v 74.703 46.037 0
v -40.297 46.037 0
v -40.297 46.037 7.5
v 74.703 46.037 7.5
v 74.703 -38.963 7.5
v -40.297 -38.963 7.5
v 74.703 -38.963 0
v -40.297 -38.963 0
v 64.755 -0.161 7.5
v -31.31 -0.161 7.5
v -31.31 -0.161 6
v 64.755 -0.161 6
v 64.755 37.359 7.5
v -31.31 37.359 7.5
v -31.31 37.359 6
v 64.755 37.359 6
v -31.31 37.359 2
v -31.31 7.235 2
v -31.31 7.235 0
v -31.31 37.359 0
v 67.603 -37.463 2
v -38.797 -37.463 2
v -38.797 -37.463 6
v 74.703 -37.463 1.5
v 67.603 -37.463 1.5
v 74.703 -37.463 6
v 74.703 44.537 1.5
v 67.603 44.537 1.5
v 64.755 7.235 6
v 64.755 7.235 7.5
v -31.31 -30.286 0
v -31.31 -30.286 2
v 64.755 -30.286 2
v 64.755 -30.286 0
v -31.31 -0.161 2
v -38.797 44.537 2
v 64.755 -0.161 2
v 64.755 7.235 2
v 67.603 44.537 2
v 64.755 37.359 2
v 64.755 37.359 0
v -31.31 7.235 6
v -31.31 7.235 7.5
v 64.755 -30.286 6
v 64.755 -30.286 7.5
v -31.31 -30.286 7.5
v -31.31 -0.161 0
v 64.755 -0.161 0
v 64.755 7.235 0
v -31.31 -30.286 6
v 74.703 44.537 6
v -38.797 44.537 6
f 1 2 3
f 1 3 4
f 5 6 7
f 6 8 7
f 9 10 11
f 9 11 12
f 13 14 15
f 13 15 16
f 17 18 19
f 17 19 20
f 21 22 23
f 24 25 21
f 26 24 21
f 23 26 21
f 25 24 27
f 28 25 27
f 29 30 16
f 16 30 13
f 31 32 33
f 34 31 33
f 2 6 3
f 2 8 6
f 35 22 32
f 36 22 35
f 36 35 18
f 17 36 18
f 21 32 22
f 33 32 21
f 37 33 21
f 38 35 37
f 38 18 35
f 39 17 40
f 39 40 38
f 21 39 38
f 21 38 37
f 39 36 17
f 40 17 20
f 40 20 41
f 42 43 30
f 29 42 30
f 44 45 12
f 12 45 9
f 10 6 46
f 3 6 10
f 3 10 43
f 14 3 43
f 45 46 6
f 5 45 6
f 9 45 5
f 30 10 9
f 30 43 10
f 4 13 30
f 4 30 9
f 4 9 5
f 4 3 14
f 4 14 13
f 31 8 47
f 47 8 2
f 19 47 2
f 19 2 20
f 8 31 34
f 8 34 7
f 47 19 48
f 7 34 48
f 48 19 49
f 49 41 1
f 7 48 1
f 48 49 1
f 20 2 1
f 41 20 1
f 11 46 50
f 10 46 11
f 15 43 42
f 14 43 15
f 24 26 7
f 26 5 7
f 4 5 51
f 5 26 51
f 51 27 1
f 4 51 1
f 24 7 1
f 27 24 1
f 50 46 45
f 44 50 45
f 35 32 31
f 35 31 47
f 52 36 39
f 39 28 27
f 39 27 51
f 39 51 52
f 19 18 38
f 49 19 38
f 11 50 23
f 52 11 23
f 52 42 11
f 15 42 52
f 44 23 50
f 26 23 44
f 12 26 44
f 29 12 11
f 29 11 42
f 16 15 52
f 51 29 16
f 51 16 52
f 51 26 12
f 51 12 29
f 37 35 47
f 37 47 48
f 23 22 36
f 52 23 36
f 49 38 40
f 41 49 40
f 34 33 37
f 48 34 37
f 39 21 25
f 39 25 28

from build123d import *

# Parameters (mm, degrees)
F0_W     = 115
F0_H     = 85
F1_DEPTH = 2
F2_W     = 115
F2_H     = 85
F2_W_2   = 112
F2_H_2   = 82
F3_DEPTH = 4
F4_W     = 115
F4_H     = 85
F5_DEPTH = 1.5
F6_W     = 82
F6_H     = 4.5
F7_DEPTH = 7.1
F8_W     = 96.06551
F8_H     = 30.124249
F8_H_2   = 30.12425
F9_DEPTH = 20


with BuildPart() as f1:
    # F0 (on Top) → F1 (new body)
    with BuildSketch(Plane.XY):
        with Locations((17.203308, 3.536641)):
            Rectangle(F0_W, F0_H)
    extrude(amount=F1_DEPTH)

    # F2 (on face) → F3 (join)
    with BuildSketch(Plane.XY.offset(2)):
        with Locations((17.203308, 3.536641)):
            Rectangle(F2_W, F2_H)
        with Locations((17.203308, 3.536641)):
            Rectangle(F2_W_2, F2_H_2, mode=Mode.SUBTRACT)
    extrude(amount=F3_DEPTH)

    # F4 (on face) → F5 (join)
    with BuildSketch(Plane.XY.offset(6)):
        with Locations((17.203308, 3.536641)):
            Rectangle(F4_W, F4_H)
    extrude(amount=F5_DEPTH)

    # F6 (on face) → F7 (cut)
    with BuildSketch(Plane.YZ.offset(74.703308)):
        with Locations((3.536641, 3.75)):
            Rectangle(F6_W, F6_H)
    extrude(amount=-F7_DEPTH, mode=Mode.SUBTRACT)

    # F8 (on face) → F9 (cut)
    with BuildSketch(Plane.XY.offset(7.5)):
        with Locations((16.722513, 22.296688)):
            Rectangle(F8_W, F8_H)
        with Locations((16.722513, -15.223406)):
            Rectangle(F8_W, F8_H_2)
    extrude(amount=-F9_DEPTH, mode=Mode.SUBTRACT)


solid = f1.part
